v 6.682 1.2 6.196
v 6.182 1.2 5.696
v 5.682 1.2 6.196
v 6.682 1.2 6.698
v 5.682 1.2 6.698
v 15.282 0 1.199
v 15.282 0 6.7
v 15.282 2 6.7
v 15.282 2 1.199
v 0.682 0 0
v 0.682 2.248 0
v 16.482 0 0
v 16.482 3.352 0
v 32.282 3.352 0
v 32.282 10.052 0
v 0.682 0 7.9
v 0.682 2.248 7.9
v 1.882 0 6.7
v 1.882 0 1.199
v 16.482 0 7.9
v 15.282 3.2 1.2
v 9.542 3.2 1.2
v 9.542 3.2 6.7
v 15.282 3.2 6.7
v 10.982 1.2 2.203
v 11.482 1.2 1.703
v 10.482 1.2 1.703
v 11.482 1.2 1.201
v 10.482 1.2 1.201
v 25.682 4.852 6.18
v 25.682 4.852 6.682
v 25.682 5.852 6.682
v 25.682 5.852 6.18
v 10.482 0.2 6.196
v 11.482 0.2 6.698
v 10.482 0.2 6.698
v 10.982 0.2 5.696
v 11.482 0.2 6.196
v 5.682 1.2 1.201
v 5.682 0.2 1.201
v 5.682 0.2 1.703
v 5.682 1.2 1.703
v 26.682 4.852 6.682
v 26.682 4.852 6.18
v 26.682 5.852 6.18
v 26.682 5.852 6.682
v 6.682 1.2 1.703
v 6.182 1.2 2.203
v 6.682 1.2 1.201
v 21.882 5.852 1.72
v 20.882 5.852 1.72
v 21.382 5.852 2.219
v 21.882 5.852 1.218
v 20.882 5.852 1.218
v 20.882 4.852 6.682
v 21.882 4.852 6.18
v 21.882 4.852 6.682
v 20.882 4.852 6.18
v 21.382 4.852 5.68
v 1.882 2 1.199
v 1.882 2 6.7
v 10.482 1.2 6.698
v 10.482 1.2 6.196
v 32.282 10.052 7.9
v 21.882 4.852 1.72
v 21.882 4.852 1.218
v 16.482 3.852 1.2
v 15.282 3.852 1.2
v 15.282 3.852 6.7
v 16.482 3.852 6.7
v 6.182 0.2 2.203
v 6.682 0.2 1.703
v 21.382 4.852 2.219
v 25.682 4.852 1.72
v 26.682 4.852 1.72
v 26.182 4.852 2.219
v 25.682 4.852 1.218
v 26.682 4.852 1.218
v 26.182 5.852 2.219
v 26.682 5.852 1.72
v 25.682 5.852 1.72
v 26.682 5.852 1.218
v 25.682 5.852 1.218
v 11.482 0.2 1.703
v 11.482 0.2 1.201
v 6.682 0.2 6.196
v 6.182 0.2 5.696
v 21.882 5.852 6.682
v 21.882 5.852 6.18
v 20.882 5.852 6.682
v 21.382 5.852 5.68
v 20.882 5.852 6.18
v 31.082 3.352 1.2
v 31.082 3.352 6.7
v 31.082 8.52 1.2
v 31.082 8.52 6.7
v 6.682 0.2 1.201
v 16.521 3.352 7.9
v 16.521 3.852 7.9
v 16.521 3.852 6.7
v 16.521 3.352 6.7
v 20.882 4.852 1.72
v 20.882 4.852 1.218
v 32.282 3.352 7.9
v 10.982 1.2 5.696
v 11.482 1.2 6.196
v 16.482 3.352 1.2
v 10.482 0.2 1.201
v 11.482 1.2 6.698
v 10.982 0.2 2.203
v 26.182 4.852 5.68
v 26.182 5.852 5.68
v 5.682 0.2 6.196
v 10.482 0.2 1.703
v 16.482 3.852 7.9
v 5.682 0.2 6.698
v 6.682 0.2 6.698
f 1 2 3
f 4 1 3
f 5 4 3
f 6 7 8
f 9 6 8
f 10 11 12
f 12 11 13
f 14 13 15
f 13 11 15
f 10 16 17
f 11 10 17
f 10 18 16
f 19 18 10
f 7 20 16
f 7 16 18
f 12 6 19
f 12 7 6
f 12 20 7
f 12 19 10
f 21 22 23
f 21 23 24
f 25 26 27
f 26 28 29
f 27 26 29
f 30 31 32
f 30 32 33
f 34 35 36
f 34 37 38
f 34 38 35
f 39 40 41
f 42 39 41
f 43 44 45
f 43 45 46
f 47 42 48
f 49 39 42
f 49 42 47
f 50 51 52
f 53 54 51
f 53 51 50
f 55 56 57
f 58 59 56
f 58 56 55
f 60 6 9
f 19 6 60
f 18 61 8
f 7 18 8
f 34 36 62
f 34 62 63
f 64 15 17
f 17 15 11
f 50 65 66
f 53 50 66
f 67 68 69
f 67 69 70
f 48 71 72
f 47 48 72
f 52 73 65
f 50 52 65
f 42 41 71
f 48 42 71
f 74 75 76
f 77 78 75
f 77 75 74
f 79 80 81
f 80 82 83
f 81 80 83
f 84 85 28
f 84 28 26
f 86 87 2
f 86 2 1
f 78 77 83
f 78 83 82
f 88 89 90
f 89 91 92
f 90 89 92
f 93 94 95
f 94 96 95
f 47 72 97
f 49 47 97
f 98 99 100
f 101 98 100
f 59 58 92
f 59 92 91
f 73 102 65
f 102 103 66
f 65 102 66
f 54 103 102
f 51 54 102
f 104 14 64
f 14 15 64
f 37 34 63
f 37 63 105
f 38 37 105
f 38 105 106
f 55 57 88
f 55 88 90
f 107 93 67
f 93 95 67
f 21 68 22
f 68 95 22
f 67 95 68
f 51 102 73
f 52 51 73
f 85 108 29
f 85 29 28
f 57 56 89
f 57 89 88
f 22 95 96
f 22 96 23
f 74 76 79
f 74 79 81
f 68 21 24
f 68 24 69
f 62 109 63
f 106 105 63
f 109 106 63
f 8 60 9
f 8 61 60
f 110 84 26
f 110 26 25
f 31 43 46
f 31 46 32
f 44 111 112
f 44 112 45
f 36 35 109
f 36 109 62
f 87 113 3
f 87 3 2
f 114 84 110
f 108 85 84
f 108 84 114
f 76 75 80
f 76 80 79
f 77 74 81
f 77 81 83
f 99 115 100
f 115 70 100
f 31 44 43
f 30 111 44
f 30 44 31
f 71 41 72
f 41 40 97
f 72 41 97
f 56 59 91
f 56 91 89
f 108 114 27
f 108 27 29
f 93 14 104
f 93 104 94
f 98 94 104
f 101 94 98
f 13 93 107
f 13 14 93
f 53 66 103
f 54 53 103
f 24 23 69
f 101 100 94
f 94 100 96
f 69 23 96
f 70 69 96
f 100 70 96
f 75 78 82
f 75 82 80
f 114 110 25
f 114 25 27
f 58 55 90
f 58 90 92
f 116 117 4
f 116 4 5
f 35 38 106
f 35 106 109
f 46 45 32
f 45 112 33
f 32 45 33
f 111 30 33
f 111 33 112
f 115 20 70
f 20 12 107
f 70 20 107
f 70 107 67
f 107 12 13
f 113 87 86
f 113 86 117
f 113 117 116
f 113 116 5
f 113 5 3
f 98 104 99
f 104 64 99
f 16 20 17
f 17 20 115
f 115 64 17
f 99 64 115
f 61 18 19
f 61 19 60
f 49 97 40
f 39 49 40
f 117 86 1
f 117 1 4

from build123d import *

# Parameters (mm, degrees)
MAINBASESKETCH_W          = 15.8
MAINBASESKETCH_H          = 3.2
MAINBASEEXTRUDE_DEPTH     = 7.9
STUDSSKETCH_R             = 2.4
STUDSEXTRUDE_DEPTH        = 1.6
MAINBASESHELL_T           = -1.2
LCUTBLUE_DEPTH            = 19.555463972
LCUTBLUE_DEPTH_BACK       = 19.555463972
CUTADDEDTOLCUT_DEPTH      = 2
MADESLIMCUTSKETCH_W       = 7.9
MADESLIMCUTSKETCH_H       = 7.9
MADESLIMCUT_DEPTH         = 19.897228453
ANGLEDSLIMBASECUT_DEPTH   = 19.555463972
ANGLEDSLIMBASESWEEP_DEPTH = 7.9
SKETCH147_W               = 5.500952983
SKETCH147_H               = 1.199047018
SWEEP27_DEPTH             = 7.9
SHELL9_START              = 1.2
SHELL9_DEPTH              = 5.5
BOSS_EXTRUDE21_START      = -0.2
BOSS_EXTRUDE21_DEPTH      = 1
BOSS_EXTRUDE21_2_DEPTH    = 1
BOSS_EXTRUDE21_3_DEPTH    = 1
BOSS_EXTRUDE21_4_DEPTH    = 1
BOSS_EXTRUDE22_START      = -1
BOSS_EXTRUDE22_DEPTH      = 1
BOSS_EXTRUDE22_2_DEPTH    = 1
BOSS_EXTRUDE22_3_DEPTH    = 1
BOSS_EXTRUDE22_4_DEPTH    = 1
BOSS_EXTRUDE24_DEPTH      = 0.5


# Read off the part's stored shape, not the designer's step: AngledSlimBaseSweep, Sweep27, Shell9
with BuildPart() as part:
    # MainBaseSketch → MainBaseExtrude (new, symmetric)
    with BuildSketch(Plane.XY):
        with Locations((8.581967213, 1.6)):
            Rectangle(MAINBASESKETCH_W, MAINBASESKETCH_H)
    extrude(amount=MAINBASEEXTRUDE_DEPTH, both=True)

    # StudsSketch → StudsExtrude (add)
    with BuildSketch(Plane(origin=(0, 3.2, 0), x_dir=(1, 0, 0), z_dir=(0, 1, 0))):
        with Locations((4.581967213, 4)):
            Circle(STUDSSKETCH_R)
    extrude(amount=STUDSEXTRUDE_DEPTH)

    # MainBaseShell
    mainbaseshell_openings = [part.faces().sort_by_distance(p)[0] for p in [
        (8.581967213, 0, 0),
    ]]
    offset(amount=MAINBASESHELL_T, openings=mainbaseshell_openings, kind=Kind.INTERSECTION)

    # LCUTBlueSketch → LCutBlue (cut, two sides: drawn at the far end of the back side and taken through both)
    with BuildSketch(Plane(origin=(0, 3.2, 0), x_dir=(1, 0, 0), z_dir=(0, 1, 0)).offset(-LCUTBLUE_DEPTH_BACK)):
        Polygon((8.581967213, 53.229874044), (8.581967213, 7.9), (8.581967213, 0), (16.481967213, 0), (61.811841258, 0), (125.917963912, 64.106122654), (72.688089868, 117.335996699), align=None)
    extrude(amount=LCUTBLUE_DEPTH + LCUTBLUE_DEPTH_BACK, mode=Mode.SUBTRACT)

    # CutAddedtoLSketch → CutAddedToLCut (add)
    with BuildSketch(Plane.XZ):
        Polygon((7.382920196, -6.7), (8.581967213, -6.7), (8.581967213, 0), (15.281967213, 0), (15.281967213, 1.199047018), (7.382920196, 1.199047018), (7.382920196, 0), align=None)
    extrude(amount=-CUTADDEDTOLCUT_DEPTH)

    # MadeSlimCutSketch → MadeSlimCut (cut, through all)
    with BuildSketch(Plane.XZ):
        with Locations((4.631967213, -3.95)):
            Rectangle(MADESLIMCUTSKETCH_W, MADESLIMCUTSKETCH_H)
    extrude(amount=-MADESLIMCUT_DEPTH, mode=Mode.SUBTRACT)

    # AngledSlimBaseSketch → AngledSlimBaseCut (cut, through all)
    with BuildSketch(Plane.XY.offset(7.9)):
        Polygon((16.481967213, 6.15), (0.681967213, 2.247699421), (16.481967213, 2.247699421), align=None)
    extrude(amount=-ANGLEDSLIMBASECUT_DEPTH, mode=Mode.SUBTRACT)


with BuildPart() as body_2:
    # of the pieces the cut leaves, the one that is kept (angledslimbasecut_keep)
    add(part.part.solids().sort_by_distance((0.681967213, 0, 7.9))[0])

    # AngledSlimBaseSweep outline → AngledSlimBaseSweep (add)
    with BuildSketch(Plane.XY):
        Polygon((16.481967213, 2.247699421), (16.481967213, 6.15), (0.681967213, 2.247699421), align=None)
    extrude(amount=ANGLEDSLIMBASESWEEP_DEPTH)

    # Sweep25: sweep along a curve in space
    with BuildLine() as sweep25_path:
        Line((7.382920196, 2, 1.199047018), (7.382920196, 0, 1.199047018))
    # Sketch147 → Sweep25 (sweep)
    with BuildSketch(Plane(origin=(0, 0, 0), x_dir=(-1, 0, 0), z_dir=(0, -1, 0))):
        with Locations((-4.632443704, -0.599523509)):
            Rectangle(SKETCH147_W, SKETCH147_H)
    sweep(path=sweep25_path.line)

    # Sweep27 outline → Sweep27 (add)
    with BuildSketch(Plane.XY):
        Polygon((32.281967213, 3.852300579), (32.281967213, 10.052300579), (16.481967213, 6.15), (16.481967213, 3.852300579), align=None)
    extrude(amount=SWEEP27_DEPTH)

    # Shell9 outline → Shell9 (cut)
    with BuildSketch(Plane.XY.offset(SHELL9_START)):
        Polygon((15.281967213, 3.2), (15.281967213, 3.852300579), (31.081967213, 3.852300579), (31.081967213, 8.51986528), (9.542398513, 3.2), align=None)
    extrude(amount=SHELL9_DEPTH, mode=Mode.SUBTRACT)

    # Sketch165 → Boss-Extrude24 (add)
    with BuildSketch(Plane(origin=(0, 3.852300579, 0), x_dir=(-1, 0, 0), z_dir=(0, -1, 0))):
        Polygon((-16.481967213, -1.2), (-16.481967213, 0), (-32.281967213, 0), (-32.281967213, -7.9), (-16.52114508, -7.9), (-16.52114508, -6.7), (-31.081967213, -6.7), (-31.081967213, -1.2), align=None)
    extrude(amount=BOSS_EXTRUDE24_DEPTH)


with BuildPart() as body_2_2:
    # Sketch163 → Boss-Extrude21 (new body)
    with BuildSketch(Plane(origin=(0, 0, 0), x_dir=(-1, 0, 0), z_dir=(0, -1, 0)).offset(BOSS_EXTRUDE21_START)):
        Polygon((-11.481967213, -1.201050686), (-11.481967213, -1.702890901), (-10.981967213, -2.202712708), (-10.481967213, -1.702890901), (-10.481967213, -1.201050686), align=None)
    extrude(amount=-BOSS_EXTRUDE21_DEPTH)


with BuildPart() as body_3:
    # Sketch163 → Boss-Extrude21 2 (new body)
    with BuildSketch(Plane(origin=(0, 0, 0), x_dir=(-1, 0, 0), z_dir=(0, -1, 0)).offset(BOSS_EXTRUDE21_START)):
        Polygon((-5.681967213, -1.702890901), (-6.181967213, -2.202712708), (-6.681967213, -1.702890901), (-6.681967213, -1.201050686), (-5.681967213, -1.201050686), align=None)
    extrude(amount=-BOSS_EXTRUDE21_2_DEPTH)


with BuildPart() as body_4:
    # Sketch163 → Boss-Extrude21 3 (new body)
    with BuildSketch(Plane(origin=(0, 0, 0), x_dir=(-1, 0, 0), z_dir=(0, -1, 0)).offset(BOSS_EXTRUDE21_START)):
        Polygon((-5.681967213, -6.697996332), (-5.681967213, -6.196156117), (-6.181967213, -5.69633431), (-6.681967213, -6.196156117), (-6.681967213, -6.697996332), align=None)
    extrude(amount=-BOSS_EXTRUDE21_3_DEPTH)


with BuildPart() as body_5:
    # Sketch163 → Boss-Extrude21 4 (new body)
    with BuildSketch(Plane(origin=(0, 0, 0), x_dir=(-1, 0, 0), z_dir=(0, -1, 0)).offset(BOSS_EXTRUDE21_START)):
        Polygon((-11.481967213, -6.697996332), (-10.481967213, -6.697996332), (-10.481967213, -6.196156117), (-10.981967213, -5.69633431), (-11.481967213, -6.196156117), align=None)
    extrude(amount=-BOSS_EXTRUDE21_4_DEPTH)


with BuildPart() as body_6:
    # Sketch164 → Boss-Extrude22 (new body)
    with BuildSketch(Plane(origin=(0, 3.852300579, 0), x_dir=(-1, 0, 0), z_dir=(0, -1, 0)).offset(BOSS_EXTRUDE22_START)):
        Polygon((-26.681967213, -1.21770137), (-26.681967213, -1.719541586), (-26.181967213, -2.219363392), (-25.681967213, -1.719541586), (-25.681967213, -1.21770137), align=None)
    extrude(amount=-BOSS_EXTRUDE22_DEPTH)


with BuildPart() as body_7:
    # Sketch164 → Boss-Extrude22 2 (new body)
    with BuildSketch(Plane(origin=(0, 3.852300579, 0), x_dir=(-1, 0, 0), z_dir=(0, -1, 0)).offset(BOSS_EXTRUDE22_START)):
        Polygon((-20.881967213, -1.719541586), (-21.381967213, -2.219363392), (-21.881967213, -1.719541586), (-21.881967213, -1.21770137), (-20.881967213, -1.21770137), align=None)
    extrude(amount=-BOSS_EXTRUDE22_2_DEPTH)


with BuildPart() as body_8:
    # Sketch164 → Boss-Extrude22 3 (new body)
    with BuildSketch(Plane(origin=(0, 3.852300579, 0), x_dir=(-1, 0, 0), z_dir=(0, -1, 0)).offset(BOSS_EXTRUDE22_START)):
        Polygon((-20.881814064, -6.681659566), (-20.881842196, -6.179819352), (-21.381870215, -5.680025575), (-21.881842195, -6.17987541), (-21.881814063, -6.681715624), align=None)
    extrude(amount=-BOSS_EXTRUDE22_3_DEPTH)


with BuildPart() as body_9:
    # Sketch164 → Boss-Extrude22 4 (new body)
    with BuildSketch(Plane(origin=(0, 3.852300579, 0), x_dir=(-1, 0, 0), z_dir=(0, -1, 0)).offset(BOSS_EXTRUDE22_START)):
        Polygon((-26.681814055, -6.681984702), (-25.681814057, -6.681928644), (-25.681842189, -6.180088429), (-26.181870207, -5.680294652), (-26.681842187, -6.180144487), align=None)
    extrude(amount=-BOSS_EXTRUDE22_4_DEPTH)


solid = Compound([body_2.part, body_2_2.part, body_3.part, body_4.part, body_5.part, body_6.part, body_7.part, body_8.part, body_9.part])
